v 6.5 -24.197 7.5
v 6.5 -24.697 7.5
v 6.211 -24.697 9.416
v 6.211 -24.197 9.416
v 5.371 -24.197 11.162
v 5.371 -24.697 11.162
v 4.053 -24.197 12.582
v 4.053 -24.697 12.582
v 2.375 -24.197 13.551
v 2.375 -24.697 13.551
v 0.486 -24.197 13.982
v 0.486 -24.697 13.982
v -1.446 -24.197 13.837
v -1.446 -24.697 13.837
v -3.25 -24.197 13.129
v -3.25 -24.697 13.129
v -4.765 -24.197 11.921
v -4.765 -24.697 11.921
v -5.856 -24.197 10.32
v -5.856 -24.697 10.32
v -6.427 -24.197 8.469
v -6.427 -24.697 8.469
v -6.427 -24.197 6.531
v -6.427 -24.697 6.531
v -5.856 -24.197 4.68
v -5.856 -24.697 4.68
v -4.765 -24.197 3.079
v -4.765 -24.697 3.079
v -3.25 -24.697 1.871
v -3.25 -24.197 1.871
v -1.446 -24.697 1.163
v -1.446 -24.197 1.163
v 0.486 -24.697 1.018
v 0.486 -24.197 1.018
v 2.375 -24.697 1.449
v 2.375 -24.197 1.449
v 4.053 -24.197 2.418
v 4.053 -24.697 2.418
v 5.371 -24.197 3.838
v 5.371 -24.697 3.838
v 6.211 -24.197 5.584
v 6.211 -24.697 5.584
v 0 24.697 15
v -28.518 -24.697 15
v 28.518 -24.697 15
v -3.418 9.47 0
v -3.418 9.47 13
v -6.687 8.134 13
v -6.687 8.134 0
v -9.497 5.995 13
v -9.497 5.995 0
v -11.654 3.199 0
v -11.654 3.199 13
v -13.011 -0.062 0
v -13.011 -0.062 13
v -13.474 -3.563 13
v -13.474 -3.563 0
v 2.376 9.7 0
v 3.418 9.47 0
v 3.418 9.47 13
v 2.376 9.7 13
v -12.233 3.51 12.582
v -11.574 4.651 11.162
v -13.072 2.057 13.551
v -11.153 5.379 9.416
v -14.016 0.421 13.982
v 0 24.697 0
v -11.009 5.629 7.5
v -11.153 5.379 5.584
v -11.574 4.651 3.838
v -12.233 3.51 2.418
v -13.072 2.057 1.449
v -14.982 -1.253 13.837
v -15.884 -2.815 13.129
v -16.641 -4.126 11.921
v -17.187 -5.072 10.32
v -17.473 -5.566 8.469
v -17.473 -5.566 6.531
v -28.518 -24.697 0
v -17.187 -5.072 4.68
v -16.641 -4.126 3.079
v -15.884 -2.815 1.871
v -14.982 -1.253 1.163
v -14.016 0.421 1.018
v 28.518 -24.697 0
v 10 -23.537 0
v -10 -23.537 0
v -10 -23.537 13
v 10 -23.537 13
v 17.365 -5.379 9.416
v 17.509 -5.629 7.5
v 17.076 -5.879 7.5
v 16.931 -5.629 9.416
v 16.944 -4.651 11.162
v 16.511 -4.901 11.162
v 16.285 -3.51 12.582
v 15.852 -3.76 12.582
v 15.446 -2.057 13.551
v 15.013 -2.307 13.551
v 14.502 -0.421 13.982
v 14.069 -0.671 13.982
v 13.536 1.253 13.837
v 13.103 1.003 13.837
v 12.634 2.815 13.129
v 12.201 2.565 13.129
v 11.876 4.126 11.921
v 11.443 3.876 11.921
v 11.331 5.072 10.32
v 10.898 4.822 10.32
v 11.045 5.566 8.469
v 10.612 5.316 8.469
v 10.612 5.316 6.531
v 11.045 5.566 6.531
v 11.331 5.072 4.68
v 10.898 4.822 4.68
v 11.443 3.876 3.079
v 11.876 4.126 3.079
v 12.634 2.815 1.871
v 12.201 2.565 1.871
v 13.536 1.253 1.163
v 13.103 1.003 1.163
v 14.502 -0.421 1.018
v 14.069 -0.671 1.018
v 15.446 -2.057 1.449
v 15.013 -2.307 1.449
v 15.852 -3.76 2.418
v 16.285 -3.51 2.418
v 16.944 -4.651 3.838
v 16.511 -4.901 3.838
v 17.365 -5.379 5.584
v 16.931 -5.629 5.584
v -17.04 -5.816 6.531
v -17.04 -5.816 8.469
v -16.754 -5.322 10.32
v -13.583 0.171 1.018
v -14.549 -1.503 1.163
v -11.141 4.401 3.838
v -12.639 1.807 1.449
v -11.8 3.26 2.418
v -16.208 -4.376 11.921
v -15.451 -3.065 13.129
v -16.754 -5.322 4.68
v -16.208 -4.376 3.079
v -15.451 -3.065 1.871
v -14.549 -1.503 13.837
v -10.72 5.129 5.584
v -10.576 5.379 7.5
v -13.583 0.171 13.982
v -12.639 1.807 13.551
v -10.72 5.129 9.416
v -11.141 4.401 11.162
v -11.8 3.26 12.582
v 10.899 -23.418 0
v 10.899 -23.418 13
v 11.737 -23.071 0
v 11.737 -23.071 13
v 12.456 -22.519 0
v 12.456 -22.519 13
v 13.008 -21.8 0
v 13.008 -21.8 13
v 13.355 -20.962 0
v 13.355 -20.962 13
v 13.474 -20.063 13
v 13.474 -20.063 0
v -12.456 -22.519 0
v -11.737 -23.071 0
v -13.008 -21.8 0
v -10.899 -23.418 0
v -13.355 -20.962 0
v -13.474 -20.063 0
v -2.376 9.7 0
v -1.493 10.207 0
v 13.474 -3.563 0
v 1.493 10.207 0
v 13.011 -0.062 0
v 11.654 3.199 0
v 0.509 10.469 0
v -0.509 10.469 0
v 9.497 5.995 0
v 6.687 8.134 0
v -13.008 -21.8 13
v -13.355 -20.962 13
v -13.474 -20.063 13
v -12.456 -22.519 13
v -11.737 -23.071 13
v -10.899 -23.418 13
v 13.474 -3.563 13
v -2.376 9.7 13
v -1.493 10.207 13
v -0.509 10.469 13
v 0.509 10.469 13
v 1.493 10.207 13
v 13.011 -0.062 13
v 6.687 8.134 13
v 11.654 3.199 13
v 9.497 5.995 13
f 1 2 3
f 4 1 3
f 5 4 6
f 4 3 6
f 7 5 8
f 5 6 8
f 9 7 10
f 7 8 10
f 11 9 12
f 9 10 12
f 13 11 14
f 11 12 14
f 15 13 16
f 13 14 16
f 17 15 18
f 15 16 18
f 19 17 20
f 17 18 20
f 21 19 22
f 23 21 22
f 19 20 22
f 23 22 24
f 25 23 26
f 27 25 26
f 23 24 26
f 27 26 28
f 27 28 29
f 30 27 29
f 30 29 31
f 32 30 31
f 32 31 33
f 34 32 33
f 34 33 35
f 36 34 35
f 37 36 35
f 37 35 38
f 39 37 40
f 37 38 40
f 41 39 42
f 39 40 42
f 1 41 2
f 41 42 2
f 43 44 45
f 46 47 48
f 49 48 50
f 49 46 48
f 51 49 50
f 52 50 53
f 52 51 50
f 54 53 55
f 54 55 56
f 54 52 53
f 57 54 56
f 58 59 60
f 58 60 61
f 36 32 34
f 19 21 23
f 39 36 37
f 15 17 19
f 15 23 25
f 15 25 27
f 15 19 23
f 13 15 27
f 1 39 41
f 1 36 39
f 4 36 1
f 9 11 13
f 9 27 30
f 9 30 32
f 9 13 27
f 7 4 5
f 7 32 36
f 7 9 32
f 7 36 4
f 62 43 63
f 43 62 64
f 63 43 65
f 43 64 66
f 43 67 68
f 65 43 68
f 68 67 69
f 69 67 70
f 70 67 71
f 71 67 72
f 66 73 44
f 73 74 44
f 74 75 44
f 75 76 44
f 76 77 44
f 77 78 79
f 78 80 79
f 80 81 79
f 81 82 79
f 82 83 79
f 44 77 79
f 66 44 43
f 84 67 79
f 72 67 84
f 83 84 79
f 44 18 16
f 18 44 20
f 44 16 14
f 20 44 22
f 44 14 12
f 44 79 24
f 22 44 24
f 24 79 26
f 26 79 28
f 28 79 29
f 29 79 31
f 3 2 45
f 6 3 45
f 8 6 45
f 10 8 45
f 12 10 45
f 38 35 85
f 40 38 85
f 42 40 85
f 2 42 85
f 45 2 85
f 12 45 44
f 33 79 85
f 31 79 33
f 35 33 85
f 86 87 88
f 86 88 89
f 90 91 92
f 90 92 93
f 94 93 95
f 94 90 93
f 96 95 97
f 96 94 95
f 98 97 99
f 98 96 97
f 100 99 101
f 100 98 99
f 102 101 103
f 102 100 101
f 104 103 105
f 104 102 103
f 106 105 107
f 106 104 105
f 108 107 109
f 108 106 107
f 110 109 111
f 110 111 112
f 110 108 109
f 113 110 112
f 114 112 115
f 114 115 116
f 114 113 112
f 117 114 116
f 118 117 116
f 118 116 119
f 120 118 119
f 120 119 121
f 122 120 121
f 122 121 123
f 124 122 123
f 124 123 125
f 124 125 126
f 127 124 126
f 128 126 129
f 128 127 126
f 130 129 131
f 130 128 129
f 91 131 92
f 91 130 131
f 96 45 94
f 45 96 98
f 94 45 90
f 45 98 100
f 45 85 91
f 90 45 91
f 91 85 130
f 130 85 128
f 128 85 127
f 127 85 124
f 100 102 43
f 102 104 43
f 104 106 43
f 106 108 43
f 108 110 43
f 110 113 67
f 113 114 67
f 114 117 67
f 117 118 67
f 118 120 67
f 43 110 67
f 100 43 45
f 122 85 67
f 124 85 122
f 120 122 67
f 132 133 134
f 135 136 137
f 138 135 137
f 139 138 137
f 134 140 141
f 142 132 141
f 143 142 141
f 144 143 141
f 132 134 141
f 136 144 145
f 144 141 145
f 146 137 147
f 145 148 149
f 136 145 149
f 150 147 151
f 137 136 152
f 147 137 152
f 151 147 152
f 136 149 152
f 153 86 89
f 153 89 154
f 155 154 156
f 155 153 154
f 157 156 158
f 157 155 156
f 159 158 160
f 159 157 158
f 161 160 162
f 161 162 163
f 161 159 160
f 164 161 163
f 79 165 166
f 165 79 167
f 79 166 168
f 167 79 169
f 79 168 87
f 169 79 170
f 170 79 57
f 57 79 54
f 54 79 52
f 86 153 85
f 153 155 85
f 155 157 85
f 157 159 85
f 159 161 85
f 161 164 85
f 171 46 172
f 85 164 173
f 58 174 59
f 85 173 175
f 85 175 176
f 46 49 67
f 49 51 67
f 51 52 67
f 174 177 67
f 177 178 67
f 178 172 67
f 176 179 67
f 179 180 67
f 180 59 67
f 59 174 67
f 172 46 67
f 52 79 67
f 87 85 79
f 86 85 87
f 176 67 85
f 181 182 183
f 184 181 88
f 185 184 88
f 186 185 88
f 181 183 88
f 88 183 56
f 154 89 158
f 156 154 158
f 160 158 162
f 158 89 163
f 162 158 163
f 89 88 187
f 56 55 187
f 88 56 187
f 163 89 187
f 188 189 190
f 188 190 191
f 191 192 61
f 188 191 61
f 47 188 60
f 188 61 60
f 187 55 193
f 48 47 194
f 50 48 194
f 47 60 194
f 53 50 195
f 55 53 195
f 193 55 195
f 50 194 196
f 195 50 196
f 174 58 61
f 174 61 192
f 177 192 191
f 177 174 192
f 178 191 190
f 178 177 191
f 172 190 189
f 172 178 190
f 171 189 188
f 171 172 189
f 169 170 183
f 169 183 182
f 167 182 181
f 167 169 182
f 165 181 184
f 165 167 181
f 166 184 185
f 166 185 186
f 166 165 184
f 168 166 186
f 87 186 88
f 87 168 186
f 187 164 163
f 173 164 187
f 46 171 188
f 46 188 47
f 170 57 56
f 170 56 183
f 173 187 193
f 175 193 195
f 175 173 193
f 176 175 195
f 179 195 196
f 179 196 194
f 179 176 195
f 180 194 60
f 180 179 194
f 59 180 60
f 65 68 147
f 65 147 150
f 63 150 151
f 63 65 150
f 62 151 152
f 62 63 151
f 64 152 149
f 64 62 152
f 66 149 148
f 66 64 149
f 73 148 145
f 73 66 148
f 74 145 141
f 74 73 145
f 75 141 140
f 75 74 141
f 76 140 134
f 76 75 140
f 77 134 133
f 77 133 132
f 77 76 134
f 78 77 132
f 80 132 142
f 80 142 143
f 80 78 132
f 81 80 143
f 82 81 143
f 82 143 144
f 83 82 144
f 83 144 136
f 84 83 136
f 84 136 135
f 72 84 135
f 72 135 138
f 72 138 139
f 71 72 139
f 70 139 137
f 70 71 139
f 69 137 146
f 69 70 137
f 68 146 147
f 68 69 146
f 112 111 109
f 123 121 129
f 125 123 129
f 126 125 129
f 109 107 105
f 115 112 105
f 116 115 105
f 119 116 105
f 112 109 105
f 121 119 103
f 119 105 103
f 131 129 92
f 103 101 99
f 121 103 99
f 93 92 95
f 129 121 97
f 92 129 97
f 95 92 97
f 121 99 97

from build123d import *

# Parameters (mm, degrees)
EXTRUDE_2_DEPTH     = 15
CUT_EXTRUDE_2_DEPTH = 13
SKETCH_5_R          = 6.5
CUT_EXTRUDE_3_DEPTH = 0.5
SKETCH_6_R          = 6.5
CUT_EXTRUDE_5_DEPTH = 0.5
SKETCH_7_R          = 6.5
CUT_EXTRUDE_8_DEPTH = 0.5


with BuildPart() as part:
    # 草图1 → 凸台-拉伸2 (new body)
    with BuildSketch(Plane.XY):
        Polygon((0, 24.697120967), (-28.517778878, -24.697120967), (28.517778878, -24.697120967), align=None)
    extrude(amount=EXTRUDE_2_DEPTH)

    # 草图4 → 切除-拉伸2 (cut)
    with BuildSketch(Plane.XY):
        with BuildLine():
            Line((-13.473817403, -3.562999264), (-13.473817403, -20.062999264))
            ThreePointArc((-13.473817403, -20.062999264), (-12.456359842, -22.519359106), (-10, -23.536816667))
            Line((-10, -23.536816667), (10, -23.536816667))
            ThreePointArc((10, -23.536816667), (12.456359842, -22.519359106), (13.473817403, -20.062999264))
            Line((13.473817403, -20.062999264), (13.473817403, -3.562999264))
            ThreePointArc((13.473817403, -3.562999264), (10.667568819, 4.667840965), (3.417761445, 9.470137814))
            Line((3.417761445, 9.470137814), (2.376312346, 9.700444286))
            ThreePointArc((2.376312346, 9.700444286), (0, 10.502453106), (-2.376312346, 9.700444286))
            Line((-2.376312346, 9.700444286), (-3.417761445, 9.470137814))
            ThreePointArc((-3.417761445, 9.470137814), (-10.667568819, 4.667840965), (-13.473817403, -3.562999264))
        make_face()
    extrude(amount=CUT_EXTRUDE_2_DEPTH, mode=Mode.SUBTRACT)

    # 草图5 → 切除-拉伸3 (cut)
    with BuildSketch(Plane.XZ.offset(24.697120967)):
        with Locations((0, 7.5)):
            Circle(SKETCH_5_R)
    extrude(amount=-CUT_EXTRUDE_3_DEPTH, mode=Mode.SUBTRACT)

    # 草图6 → 切除-拉伸5 (cut)
    with BuildSketch(Plane(origin=(-14.258889439, 0, 0), x_dir=(0.5, 0.866025404, 0), z_dir=(0.866025404, -0.5, 0))):
        with Locations((0, 7.5)):
            Circle(SKETCH_6_R)
    extrude(amount=CUT_EXTRUDE_5_DEPTH, mode=Mode.SUBTRACT)

    # 草图7 → 切除-拉伸8 (cut)
    with BuildSketch(Plane(origin=(14.258889439, 0, 0), x_dir=(0.5, -0.866025404, 0), z_dir=(-0.866025404, -0.5, 0))):
        with Locations((0, 7.5)):
            Circle(SKETCH_7_R)
    extrude(amount=CUT_EXTRUDE_8_DEPTH, mode=Mode.SUBTRACT)


solid = part.part
